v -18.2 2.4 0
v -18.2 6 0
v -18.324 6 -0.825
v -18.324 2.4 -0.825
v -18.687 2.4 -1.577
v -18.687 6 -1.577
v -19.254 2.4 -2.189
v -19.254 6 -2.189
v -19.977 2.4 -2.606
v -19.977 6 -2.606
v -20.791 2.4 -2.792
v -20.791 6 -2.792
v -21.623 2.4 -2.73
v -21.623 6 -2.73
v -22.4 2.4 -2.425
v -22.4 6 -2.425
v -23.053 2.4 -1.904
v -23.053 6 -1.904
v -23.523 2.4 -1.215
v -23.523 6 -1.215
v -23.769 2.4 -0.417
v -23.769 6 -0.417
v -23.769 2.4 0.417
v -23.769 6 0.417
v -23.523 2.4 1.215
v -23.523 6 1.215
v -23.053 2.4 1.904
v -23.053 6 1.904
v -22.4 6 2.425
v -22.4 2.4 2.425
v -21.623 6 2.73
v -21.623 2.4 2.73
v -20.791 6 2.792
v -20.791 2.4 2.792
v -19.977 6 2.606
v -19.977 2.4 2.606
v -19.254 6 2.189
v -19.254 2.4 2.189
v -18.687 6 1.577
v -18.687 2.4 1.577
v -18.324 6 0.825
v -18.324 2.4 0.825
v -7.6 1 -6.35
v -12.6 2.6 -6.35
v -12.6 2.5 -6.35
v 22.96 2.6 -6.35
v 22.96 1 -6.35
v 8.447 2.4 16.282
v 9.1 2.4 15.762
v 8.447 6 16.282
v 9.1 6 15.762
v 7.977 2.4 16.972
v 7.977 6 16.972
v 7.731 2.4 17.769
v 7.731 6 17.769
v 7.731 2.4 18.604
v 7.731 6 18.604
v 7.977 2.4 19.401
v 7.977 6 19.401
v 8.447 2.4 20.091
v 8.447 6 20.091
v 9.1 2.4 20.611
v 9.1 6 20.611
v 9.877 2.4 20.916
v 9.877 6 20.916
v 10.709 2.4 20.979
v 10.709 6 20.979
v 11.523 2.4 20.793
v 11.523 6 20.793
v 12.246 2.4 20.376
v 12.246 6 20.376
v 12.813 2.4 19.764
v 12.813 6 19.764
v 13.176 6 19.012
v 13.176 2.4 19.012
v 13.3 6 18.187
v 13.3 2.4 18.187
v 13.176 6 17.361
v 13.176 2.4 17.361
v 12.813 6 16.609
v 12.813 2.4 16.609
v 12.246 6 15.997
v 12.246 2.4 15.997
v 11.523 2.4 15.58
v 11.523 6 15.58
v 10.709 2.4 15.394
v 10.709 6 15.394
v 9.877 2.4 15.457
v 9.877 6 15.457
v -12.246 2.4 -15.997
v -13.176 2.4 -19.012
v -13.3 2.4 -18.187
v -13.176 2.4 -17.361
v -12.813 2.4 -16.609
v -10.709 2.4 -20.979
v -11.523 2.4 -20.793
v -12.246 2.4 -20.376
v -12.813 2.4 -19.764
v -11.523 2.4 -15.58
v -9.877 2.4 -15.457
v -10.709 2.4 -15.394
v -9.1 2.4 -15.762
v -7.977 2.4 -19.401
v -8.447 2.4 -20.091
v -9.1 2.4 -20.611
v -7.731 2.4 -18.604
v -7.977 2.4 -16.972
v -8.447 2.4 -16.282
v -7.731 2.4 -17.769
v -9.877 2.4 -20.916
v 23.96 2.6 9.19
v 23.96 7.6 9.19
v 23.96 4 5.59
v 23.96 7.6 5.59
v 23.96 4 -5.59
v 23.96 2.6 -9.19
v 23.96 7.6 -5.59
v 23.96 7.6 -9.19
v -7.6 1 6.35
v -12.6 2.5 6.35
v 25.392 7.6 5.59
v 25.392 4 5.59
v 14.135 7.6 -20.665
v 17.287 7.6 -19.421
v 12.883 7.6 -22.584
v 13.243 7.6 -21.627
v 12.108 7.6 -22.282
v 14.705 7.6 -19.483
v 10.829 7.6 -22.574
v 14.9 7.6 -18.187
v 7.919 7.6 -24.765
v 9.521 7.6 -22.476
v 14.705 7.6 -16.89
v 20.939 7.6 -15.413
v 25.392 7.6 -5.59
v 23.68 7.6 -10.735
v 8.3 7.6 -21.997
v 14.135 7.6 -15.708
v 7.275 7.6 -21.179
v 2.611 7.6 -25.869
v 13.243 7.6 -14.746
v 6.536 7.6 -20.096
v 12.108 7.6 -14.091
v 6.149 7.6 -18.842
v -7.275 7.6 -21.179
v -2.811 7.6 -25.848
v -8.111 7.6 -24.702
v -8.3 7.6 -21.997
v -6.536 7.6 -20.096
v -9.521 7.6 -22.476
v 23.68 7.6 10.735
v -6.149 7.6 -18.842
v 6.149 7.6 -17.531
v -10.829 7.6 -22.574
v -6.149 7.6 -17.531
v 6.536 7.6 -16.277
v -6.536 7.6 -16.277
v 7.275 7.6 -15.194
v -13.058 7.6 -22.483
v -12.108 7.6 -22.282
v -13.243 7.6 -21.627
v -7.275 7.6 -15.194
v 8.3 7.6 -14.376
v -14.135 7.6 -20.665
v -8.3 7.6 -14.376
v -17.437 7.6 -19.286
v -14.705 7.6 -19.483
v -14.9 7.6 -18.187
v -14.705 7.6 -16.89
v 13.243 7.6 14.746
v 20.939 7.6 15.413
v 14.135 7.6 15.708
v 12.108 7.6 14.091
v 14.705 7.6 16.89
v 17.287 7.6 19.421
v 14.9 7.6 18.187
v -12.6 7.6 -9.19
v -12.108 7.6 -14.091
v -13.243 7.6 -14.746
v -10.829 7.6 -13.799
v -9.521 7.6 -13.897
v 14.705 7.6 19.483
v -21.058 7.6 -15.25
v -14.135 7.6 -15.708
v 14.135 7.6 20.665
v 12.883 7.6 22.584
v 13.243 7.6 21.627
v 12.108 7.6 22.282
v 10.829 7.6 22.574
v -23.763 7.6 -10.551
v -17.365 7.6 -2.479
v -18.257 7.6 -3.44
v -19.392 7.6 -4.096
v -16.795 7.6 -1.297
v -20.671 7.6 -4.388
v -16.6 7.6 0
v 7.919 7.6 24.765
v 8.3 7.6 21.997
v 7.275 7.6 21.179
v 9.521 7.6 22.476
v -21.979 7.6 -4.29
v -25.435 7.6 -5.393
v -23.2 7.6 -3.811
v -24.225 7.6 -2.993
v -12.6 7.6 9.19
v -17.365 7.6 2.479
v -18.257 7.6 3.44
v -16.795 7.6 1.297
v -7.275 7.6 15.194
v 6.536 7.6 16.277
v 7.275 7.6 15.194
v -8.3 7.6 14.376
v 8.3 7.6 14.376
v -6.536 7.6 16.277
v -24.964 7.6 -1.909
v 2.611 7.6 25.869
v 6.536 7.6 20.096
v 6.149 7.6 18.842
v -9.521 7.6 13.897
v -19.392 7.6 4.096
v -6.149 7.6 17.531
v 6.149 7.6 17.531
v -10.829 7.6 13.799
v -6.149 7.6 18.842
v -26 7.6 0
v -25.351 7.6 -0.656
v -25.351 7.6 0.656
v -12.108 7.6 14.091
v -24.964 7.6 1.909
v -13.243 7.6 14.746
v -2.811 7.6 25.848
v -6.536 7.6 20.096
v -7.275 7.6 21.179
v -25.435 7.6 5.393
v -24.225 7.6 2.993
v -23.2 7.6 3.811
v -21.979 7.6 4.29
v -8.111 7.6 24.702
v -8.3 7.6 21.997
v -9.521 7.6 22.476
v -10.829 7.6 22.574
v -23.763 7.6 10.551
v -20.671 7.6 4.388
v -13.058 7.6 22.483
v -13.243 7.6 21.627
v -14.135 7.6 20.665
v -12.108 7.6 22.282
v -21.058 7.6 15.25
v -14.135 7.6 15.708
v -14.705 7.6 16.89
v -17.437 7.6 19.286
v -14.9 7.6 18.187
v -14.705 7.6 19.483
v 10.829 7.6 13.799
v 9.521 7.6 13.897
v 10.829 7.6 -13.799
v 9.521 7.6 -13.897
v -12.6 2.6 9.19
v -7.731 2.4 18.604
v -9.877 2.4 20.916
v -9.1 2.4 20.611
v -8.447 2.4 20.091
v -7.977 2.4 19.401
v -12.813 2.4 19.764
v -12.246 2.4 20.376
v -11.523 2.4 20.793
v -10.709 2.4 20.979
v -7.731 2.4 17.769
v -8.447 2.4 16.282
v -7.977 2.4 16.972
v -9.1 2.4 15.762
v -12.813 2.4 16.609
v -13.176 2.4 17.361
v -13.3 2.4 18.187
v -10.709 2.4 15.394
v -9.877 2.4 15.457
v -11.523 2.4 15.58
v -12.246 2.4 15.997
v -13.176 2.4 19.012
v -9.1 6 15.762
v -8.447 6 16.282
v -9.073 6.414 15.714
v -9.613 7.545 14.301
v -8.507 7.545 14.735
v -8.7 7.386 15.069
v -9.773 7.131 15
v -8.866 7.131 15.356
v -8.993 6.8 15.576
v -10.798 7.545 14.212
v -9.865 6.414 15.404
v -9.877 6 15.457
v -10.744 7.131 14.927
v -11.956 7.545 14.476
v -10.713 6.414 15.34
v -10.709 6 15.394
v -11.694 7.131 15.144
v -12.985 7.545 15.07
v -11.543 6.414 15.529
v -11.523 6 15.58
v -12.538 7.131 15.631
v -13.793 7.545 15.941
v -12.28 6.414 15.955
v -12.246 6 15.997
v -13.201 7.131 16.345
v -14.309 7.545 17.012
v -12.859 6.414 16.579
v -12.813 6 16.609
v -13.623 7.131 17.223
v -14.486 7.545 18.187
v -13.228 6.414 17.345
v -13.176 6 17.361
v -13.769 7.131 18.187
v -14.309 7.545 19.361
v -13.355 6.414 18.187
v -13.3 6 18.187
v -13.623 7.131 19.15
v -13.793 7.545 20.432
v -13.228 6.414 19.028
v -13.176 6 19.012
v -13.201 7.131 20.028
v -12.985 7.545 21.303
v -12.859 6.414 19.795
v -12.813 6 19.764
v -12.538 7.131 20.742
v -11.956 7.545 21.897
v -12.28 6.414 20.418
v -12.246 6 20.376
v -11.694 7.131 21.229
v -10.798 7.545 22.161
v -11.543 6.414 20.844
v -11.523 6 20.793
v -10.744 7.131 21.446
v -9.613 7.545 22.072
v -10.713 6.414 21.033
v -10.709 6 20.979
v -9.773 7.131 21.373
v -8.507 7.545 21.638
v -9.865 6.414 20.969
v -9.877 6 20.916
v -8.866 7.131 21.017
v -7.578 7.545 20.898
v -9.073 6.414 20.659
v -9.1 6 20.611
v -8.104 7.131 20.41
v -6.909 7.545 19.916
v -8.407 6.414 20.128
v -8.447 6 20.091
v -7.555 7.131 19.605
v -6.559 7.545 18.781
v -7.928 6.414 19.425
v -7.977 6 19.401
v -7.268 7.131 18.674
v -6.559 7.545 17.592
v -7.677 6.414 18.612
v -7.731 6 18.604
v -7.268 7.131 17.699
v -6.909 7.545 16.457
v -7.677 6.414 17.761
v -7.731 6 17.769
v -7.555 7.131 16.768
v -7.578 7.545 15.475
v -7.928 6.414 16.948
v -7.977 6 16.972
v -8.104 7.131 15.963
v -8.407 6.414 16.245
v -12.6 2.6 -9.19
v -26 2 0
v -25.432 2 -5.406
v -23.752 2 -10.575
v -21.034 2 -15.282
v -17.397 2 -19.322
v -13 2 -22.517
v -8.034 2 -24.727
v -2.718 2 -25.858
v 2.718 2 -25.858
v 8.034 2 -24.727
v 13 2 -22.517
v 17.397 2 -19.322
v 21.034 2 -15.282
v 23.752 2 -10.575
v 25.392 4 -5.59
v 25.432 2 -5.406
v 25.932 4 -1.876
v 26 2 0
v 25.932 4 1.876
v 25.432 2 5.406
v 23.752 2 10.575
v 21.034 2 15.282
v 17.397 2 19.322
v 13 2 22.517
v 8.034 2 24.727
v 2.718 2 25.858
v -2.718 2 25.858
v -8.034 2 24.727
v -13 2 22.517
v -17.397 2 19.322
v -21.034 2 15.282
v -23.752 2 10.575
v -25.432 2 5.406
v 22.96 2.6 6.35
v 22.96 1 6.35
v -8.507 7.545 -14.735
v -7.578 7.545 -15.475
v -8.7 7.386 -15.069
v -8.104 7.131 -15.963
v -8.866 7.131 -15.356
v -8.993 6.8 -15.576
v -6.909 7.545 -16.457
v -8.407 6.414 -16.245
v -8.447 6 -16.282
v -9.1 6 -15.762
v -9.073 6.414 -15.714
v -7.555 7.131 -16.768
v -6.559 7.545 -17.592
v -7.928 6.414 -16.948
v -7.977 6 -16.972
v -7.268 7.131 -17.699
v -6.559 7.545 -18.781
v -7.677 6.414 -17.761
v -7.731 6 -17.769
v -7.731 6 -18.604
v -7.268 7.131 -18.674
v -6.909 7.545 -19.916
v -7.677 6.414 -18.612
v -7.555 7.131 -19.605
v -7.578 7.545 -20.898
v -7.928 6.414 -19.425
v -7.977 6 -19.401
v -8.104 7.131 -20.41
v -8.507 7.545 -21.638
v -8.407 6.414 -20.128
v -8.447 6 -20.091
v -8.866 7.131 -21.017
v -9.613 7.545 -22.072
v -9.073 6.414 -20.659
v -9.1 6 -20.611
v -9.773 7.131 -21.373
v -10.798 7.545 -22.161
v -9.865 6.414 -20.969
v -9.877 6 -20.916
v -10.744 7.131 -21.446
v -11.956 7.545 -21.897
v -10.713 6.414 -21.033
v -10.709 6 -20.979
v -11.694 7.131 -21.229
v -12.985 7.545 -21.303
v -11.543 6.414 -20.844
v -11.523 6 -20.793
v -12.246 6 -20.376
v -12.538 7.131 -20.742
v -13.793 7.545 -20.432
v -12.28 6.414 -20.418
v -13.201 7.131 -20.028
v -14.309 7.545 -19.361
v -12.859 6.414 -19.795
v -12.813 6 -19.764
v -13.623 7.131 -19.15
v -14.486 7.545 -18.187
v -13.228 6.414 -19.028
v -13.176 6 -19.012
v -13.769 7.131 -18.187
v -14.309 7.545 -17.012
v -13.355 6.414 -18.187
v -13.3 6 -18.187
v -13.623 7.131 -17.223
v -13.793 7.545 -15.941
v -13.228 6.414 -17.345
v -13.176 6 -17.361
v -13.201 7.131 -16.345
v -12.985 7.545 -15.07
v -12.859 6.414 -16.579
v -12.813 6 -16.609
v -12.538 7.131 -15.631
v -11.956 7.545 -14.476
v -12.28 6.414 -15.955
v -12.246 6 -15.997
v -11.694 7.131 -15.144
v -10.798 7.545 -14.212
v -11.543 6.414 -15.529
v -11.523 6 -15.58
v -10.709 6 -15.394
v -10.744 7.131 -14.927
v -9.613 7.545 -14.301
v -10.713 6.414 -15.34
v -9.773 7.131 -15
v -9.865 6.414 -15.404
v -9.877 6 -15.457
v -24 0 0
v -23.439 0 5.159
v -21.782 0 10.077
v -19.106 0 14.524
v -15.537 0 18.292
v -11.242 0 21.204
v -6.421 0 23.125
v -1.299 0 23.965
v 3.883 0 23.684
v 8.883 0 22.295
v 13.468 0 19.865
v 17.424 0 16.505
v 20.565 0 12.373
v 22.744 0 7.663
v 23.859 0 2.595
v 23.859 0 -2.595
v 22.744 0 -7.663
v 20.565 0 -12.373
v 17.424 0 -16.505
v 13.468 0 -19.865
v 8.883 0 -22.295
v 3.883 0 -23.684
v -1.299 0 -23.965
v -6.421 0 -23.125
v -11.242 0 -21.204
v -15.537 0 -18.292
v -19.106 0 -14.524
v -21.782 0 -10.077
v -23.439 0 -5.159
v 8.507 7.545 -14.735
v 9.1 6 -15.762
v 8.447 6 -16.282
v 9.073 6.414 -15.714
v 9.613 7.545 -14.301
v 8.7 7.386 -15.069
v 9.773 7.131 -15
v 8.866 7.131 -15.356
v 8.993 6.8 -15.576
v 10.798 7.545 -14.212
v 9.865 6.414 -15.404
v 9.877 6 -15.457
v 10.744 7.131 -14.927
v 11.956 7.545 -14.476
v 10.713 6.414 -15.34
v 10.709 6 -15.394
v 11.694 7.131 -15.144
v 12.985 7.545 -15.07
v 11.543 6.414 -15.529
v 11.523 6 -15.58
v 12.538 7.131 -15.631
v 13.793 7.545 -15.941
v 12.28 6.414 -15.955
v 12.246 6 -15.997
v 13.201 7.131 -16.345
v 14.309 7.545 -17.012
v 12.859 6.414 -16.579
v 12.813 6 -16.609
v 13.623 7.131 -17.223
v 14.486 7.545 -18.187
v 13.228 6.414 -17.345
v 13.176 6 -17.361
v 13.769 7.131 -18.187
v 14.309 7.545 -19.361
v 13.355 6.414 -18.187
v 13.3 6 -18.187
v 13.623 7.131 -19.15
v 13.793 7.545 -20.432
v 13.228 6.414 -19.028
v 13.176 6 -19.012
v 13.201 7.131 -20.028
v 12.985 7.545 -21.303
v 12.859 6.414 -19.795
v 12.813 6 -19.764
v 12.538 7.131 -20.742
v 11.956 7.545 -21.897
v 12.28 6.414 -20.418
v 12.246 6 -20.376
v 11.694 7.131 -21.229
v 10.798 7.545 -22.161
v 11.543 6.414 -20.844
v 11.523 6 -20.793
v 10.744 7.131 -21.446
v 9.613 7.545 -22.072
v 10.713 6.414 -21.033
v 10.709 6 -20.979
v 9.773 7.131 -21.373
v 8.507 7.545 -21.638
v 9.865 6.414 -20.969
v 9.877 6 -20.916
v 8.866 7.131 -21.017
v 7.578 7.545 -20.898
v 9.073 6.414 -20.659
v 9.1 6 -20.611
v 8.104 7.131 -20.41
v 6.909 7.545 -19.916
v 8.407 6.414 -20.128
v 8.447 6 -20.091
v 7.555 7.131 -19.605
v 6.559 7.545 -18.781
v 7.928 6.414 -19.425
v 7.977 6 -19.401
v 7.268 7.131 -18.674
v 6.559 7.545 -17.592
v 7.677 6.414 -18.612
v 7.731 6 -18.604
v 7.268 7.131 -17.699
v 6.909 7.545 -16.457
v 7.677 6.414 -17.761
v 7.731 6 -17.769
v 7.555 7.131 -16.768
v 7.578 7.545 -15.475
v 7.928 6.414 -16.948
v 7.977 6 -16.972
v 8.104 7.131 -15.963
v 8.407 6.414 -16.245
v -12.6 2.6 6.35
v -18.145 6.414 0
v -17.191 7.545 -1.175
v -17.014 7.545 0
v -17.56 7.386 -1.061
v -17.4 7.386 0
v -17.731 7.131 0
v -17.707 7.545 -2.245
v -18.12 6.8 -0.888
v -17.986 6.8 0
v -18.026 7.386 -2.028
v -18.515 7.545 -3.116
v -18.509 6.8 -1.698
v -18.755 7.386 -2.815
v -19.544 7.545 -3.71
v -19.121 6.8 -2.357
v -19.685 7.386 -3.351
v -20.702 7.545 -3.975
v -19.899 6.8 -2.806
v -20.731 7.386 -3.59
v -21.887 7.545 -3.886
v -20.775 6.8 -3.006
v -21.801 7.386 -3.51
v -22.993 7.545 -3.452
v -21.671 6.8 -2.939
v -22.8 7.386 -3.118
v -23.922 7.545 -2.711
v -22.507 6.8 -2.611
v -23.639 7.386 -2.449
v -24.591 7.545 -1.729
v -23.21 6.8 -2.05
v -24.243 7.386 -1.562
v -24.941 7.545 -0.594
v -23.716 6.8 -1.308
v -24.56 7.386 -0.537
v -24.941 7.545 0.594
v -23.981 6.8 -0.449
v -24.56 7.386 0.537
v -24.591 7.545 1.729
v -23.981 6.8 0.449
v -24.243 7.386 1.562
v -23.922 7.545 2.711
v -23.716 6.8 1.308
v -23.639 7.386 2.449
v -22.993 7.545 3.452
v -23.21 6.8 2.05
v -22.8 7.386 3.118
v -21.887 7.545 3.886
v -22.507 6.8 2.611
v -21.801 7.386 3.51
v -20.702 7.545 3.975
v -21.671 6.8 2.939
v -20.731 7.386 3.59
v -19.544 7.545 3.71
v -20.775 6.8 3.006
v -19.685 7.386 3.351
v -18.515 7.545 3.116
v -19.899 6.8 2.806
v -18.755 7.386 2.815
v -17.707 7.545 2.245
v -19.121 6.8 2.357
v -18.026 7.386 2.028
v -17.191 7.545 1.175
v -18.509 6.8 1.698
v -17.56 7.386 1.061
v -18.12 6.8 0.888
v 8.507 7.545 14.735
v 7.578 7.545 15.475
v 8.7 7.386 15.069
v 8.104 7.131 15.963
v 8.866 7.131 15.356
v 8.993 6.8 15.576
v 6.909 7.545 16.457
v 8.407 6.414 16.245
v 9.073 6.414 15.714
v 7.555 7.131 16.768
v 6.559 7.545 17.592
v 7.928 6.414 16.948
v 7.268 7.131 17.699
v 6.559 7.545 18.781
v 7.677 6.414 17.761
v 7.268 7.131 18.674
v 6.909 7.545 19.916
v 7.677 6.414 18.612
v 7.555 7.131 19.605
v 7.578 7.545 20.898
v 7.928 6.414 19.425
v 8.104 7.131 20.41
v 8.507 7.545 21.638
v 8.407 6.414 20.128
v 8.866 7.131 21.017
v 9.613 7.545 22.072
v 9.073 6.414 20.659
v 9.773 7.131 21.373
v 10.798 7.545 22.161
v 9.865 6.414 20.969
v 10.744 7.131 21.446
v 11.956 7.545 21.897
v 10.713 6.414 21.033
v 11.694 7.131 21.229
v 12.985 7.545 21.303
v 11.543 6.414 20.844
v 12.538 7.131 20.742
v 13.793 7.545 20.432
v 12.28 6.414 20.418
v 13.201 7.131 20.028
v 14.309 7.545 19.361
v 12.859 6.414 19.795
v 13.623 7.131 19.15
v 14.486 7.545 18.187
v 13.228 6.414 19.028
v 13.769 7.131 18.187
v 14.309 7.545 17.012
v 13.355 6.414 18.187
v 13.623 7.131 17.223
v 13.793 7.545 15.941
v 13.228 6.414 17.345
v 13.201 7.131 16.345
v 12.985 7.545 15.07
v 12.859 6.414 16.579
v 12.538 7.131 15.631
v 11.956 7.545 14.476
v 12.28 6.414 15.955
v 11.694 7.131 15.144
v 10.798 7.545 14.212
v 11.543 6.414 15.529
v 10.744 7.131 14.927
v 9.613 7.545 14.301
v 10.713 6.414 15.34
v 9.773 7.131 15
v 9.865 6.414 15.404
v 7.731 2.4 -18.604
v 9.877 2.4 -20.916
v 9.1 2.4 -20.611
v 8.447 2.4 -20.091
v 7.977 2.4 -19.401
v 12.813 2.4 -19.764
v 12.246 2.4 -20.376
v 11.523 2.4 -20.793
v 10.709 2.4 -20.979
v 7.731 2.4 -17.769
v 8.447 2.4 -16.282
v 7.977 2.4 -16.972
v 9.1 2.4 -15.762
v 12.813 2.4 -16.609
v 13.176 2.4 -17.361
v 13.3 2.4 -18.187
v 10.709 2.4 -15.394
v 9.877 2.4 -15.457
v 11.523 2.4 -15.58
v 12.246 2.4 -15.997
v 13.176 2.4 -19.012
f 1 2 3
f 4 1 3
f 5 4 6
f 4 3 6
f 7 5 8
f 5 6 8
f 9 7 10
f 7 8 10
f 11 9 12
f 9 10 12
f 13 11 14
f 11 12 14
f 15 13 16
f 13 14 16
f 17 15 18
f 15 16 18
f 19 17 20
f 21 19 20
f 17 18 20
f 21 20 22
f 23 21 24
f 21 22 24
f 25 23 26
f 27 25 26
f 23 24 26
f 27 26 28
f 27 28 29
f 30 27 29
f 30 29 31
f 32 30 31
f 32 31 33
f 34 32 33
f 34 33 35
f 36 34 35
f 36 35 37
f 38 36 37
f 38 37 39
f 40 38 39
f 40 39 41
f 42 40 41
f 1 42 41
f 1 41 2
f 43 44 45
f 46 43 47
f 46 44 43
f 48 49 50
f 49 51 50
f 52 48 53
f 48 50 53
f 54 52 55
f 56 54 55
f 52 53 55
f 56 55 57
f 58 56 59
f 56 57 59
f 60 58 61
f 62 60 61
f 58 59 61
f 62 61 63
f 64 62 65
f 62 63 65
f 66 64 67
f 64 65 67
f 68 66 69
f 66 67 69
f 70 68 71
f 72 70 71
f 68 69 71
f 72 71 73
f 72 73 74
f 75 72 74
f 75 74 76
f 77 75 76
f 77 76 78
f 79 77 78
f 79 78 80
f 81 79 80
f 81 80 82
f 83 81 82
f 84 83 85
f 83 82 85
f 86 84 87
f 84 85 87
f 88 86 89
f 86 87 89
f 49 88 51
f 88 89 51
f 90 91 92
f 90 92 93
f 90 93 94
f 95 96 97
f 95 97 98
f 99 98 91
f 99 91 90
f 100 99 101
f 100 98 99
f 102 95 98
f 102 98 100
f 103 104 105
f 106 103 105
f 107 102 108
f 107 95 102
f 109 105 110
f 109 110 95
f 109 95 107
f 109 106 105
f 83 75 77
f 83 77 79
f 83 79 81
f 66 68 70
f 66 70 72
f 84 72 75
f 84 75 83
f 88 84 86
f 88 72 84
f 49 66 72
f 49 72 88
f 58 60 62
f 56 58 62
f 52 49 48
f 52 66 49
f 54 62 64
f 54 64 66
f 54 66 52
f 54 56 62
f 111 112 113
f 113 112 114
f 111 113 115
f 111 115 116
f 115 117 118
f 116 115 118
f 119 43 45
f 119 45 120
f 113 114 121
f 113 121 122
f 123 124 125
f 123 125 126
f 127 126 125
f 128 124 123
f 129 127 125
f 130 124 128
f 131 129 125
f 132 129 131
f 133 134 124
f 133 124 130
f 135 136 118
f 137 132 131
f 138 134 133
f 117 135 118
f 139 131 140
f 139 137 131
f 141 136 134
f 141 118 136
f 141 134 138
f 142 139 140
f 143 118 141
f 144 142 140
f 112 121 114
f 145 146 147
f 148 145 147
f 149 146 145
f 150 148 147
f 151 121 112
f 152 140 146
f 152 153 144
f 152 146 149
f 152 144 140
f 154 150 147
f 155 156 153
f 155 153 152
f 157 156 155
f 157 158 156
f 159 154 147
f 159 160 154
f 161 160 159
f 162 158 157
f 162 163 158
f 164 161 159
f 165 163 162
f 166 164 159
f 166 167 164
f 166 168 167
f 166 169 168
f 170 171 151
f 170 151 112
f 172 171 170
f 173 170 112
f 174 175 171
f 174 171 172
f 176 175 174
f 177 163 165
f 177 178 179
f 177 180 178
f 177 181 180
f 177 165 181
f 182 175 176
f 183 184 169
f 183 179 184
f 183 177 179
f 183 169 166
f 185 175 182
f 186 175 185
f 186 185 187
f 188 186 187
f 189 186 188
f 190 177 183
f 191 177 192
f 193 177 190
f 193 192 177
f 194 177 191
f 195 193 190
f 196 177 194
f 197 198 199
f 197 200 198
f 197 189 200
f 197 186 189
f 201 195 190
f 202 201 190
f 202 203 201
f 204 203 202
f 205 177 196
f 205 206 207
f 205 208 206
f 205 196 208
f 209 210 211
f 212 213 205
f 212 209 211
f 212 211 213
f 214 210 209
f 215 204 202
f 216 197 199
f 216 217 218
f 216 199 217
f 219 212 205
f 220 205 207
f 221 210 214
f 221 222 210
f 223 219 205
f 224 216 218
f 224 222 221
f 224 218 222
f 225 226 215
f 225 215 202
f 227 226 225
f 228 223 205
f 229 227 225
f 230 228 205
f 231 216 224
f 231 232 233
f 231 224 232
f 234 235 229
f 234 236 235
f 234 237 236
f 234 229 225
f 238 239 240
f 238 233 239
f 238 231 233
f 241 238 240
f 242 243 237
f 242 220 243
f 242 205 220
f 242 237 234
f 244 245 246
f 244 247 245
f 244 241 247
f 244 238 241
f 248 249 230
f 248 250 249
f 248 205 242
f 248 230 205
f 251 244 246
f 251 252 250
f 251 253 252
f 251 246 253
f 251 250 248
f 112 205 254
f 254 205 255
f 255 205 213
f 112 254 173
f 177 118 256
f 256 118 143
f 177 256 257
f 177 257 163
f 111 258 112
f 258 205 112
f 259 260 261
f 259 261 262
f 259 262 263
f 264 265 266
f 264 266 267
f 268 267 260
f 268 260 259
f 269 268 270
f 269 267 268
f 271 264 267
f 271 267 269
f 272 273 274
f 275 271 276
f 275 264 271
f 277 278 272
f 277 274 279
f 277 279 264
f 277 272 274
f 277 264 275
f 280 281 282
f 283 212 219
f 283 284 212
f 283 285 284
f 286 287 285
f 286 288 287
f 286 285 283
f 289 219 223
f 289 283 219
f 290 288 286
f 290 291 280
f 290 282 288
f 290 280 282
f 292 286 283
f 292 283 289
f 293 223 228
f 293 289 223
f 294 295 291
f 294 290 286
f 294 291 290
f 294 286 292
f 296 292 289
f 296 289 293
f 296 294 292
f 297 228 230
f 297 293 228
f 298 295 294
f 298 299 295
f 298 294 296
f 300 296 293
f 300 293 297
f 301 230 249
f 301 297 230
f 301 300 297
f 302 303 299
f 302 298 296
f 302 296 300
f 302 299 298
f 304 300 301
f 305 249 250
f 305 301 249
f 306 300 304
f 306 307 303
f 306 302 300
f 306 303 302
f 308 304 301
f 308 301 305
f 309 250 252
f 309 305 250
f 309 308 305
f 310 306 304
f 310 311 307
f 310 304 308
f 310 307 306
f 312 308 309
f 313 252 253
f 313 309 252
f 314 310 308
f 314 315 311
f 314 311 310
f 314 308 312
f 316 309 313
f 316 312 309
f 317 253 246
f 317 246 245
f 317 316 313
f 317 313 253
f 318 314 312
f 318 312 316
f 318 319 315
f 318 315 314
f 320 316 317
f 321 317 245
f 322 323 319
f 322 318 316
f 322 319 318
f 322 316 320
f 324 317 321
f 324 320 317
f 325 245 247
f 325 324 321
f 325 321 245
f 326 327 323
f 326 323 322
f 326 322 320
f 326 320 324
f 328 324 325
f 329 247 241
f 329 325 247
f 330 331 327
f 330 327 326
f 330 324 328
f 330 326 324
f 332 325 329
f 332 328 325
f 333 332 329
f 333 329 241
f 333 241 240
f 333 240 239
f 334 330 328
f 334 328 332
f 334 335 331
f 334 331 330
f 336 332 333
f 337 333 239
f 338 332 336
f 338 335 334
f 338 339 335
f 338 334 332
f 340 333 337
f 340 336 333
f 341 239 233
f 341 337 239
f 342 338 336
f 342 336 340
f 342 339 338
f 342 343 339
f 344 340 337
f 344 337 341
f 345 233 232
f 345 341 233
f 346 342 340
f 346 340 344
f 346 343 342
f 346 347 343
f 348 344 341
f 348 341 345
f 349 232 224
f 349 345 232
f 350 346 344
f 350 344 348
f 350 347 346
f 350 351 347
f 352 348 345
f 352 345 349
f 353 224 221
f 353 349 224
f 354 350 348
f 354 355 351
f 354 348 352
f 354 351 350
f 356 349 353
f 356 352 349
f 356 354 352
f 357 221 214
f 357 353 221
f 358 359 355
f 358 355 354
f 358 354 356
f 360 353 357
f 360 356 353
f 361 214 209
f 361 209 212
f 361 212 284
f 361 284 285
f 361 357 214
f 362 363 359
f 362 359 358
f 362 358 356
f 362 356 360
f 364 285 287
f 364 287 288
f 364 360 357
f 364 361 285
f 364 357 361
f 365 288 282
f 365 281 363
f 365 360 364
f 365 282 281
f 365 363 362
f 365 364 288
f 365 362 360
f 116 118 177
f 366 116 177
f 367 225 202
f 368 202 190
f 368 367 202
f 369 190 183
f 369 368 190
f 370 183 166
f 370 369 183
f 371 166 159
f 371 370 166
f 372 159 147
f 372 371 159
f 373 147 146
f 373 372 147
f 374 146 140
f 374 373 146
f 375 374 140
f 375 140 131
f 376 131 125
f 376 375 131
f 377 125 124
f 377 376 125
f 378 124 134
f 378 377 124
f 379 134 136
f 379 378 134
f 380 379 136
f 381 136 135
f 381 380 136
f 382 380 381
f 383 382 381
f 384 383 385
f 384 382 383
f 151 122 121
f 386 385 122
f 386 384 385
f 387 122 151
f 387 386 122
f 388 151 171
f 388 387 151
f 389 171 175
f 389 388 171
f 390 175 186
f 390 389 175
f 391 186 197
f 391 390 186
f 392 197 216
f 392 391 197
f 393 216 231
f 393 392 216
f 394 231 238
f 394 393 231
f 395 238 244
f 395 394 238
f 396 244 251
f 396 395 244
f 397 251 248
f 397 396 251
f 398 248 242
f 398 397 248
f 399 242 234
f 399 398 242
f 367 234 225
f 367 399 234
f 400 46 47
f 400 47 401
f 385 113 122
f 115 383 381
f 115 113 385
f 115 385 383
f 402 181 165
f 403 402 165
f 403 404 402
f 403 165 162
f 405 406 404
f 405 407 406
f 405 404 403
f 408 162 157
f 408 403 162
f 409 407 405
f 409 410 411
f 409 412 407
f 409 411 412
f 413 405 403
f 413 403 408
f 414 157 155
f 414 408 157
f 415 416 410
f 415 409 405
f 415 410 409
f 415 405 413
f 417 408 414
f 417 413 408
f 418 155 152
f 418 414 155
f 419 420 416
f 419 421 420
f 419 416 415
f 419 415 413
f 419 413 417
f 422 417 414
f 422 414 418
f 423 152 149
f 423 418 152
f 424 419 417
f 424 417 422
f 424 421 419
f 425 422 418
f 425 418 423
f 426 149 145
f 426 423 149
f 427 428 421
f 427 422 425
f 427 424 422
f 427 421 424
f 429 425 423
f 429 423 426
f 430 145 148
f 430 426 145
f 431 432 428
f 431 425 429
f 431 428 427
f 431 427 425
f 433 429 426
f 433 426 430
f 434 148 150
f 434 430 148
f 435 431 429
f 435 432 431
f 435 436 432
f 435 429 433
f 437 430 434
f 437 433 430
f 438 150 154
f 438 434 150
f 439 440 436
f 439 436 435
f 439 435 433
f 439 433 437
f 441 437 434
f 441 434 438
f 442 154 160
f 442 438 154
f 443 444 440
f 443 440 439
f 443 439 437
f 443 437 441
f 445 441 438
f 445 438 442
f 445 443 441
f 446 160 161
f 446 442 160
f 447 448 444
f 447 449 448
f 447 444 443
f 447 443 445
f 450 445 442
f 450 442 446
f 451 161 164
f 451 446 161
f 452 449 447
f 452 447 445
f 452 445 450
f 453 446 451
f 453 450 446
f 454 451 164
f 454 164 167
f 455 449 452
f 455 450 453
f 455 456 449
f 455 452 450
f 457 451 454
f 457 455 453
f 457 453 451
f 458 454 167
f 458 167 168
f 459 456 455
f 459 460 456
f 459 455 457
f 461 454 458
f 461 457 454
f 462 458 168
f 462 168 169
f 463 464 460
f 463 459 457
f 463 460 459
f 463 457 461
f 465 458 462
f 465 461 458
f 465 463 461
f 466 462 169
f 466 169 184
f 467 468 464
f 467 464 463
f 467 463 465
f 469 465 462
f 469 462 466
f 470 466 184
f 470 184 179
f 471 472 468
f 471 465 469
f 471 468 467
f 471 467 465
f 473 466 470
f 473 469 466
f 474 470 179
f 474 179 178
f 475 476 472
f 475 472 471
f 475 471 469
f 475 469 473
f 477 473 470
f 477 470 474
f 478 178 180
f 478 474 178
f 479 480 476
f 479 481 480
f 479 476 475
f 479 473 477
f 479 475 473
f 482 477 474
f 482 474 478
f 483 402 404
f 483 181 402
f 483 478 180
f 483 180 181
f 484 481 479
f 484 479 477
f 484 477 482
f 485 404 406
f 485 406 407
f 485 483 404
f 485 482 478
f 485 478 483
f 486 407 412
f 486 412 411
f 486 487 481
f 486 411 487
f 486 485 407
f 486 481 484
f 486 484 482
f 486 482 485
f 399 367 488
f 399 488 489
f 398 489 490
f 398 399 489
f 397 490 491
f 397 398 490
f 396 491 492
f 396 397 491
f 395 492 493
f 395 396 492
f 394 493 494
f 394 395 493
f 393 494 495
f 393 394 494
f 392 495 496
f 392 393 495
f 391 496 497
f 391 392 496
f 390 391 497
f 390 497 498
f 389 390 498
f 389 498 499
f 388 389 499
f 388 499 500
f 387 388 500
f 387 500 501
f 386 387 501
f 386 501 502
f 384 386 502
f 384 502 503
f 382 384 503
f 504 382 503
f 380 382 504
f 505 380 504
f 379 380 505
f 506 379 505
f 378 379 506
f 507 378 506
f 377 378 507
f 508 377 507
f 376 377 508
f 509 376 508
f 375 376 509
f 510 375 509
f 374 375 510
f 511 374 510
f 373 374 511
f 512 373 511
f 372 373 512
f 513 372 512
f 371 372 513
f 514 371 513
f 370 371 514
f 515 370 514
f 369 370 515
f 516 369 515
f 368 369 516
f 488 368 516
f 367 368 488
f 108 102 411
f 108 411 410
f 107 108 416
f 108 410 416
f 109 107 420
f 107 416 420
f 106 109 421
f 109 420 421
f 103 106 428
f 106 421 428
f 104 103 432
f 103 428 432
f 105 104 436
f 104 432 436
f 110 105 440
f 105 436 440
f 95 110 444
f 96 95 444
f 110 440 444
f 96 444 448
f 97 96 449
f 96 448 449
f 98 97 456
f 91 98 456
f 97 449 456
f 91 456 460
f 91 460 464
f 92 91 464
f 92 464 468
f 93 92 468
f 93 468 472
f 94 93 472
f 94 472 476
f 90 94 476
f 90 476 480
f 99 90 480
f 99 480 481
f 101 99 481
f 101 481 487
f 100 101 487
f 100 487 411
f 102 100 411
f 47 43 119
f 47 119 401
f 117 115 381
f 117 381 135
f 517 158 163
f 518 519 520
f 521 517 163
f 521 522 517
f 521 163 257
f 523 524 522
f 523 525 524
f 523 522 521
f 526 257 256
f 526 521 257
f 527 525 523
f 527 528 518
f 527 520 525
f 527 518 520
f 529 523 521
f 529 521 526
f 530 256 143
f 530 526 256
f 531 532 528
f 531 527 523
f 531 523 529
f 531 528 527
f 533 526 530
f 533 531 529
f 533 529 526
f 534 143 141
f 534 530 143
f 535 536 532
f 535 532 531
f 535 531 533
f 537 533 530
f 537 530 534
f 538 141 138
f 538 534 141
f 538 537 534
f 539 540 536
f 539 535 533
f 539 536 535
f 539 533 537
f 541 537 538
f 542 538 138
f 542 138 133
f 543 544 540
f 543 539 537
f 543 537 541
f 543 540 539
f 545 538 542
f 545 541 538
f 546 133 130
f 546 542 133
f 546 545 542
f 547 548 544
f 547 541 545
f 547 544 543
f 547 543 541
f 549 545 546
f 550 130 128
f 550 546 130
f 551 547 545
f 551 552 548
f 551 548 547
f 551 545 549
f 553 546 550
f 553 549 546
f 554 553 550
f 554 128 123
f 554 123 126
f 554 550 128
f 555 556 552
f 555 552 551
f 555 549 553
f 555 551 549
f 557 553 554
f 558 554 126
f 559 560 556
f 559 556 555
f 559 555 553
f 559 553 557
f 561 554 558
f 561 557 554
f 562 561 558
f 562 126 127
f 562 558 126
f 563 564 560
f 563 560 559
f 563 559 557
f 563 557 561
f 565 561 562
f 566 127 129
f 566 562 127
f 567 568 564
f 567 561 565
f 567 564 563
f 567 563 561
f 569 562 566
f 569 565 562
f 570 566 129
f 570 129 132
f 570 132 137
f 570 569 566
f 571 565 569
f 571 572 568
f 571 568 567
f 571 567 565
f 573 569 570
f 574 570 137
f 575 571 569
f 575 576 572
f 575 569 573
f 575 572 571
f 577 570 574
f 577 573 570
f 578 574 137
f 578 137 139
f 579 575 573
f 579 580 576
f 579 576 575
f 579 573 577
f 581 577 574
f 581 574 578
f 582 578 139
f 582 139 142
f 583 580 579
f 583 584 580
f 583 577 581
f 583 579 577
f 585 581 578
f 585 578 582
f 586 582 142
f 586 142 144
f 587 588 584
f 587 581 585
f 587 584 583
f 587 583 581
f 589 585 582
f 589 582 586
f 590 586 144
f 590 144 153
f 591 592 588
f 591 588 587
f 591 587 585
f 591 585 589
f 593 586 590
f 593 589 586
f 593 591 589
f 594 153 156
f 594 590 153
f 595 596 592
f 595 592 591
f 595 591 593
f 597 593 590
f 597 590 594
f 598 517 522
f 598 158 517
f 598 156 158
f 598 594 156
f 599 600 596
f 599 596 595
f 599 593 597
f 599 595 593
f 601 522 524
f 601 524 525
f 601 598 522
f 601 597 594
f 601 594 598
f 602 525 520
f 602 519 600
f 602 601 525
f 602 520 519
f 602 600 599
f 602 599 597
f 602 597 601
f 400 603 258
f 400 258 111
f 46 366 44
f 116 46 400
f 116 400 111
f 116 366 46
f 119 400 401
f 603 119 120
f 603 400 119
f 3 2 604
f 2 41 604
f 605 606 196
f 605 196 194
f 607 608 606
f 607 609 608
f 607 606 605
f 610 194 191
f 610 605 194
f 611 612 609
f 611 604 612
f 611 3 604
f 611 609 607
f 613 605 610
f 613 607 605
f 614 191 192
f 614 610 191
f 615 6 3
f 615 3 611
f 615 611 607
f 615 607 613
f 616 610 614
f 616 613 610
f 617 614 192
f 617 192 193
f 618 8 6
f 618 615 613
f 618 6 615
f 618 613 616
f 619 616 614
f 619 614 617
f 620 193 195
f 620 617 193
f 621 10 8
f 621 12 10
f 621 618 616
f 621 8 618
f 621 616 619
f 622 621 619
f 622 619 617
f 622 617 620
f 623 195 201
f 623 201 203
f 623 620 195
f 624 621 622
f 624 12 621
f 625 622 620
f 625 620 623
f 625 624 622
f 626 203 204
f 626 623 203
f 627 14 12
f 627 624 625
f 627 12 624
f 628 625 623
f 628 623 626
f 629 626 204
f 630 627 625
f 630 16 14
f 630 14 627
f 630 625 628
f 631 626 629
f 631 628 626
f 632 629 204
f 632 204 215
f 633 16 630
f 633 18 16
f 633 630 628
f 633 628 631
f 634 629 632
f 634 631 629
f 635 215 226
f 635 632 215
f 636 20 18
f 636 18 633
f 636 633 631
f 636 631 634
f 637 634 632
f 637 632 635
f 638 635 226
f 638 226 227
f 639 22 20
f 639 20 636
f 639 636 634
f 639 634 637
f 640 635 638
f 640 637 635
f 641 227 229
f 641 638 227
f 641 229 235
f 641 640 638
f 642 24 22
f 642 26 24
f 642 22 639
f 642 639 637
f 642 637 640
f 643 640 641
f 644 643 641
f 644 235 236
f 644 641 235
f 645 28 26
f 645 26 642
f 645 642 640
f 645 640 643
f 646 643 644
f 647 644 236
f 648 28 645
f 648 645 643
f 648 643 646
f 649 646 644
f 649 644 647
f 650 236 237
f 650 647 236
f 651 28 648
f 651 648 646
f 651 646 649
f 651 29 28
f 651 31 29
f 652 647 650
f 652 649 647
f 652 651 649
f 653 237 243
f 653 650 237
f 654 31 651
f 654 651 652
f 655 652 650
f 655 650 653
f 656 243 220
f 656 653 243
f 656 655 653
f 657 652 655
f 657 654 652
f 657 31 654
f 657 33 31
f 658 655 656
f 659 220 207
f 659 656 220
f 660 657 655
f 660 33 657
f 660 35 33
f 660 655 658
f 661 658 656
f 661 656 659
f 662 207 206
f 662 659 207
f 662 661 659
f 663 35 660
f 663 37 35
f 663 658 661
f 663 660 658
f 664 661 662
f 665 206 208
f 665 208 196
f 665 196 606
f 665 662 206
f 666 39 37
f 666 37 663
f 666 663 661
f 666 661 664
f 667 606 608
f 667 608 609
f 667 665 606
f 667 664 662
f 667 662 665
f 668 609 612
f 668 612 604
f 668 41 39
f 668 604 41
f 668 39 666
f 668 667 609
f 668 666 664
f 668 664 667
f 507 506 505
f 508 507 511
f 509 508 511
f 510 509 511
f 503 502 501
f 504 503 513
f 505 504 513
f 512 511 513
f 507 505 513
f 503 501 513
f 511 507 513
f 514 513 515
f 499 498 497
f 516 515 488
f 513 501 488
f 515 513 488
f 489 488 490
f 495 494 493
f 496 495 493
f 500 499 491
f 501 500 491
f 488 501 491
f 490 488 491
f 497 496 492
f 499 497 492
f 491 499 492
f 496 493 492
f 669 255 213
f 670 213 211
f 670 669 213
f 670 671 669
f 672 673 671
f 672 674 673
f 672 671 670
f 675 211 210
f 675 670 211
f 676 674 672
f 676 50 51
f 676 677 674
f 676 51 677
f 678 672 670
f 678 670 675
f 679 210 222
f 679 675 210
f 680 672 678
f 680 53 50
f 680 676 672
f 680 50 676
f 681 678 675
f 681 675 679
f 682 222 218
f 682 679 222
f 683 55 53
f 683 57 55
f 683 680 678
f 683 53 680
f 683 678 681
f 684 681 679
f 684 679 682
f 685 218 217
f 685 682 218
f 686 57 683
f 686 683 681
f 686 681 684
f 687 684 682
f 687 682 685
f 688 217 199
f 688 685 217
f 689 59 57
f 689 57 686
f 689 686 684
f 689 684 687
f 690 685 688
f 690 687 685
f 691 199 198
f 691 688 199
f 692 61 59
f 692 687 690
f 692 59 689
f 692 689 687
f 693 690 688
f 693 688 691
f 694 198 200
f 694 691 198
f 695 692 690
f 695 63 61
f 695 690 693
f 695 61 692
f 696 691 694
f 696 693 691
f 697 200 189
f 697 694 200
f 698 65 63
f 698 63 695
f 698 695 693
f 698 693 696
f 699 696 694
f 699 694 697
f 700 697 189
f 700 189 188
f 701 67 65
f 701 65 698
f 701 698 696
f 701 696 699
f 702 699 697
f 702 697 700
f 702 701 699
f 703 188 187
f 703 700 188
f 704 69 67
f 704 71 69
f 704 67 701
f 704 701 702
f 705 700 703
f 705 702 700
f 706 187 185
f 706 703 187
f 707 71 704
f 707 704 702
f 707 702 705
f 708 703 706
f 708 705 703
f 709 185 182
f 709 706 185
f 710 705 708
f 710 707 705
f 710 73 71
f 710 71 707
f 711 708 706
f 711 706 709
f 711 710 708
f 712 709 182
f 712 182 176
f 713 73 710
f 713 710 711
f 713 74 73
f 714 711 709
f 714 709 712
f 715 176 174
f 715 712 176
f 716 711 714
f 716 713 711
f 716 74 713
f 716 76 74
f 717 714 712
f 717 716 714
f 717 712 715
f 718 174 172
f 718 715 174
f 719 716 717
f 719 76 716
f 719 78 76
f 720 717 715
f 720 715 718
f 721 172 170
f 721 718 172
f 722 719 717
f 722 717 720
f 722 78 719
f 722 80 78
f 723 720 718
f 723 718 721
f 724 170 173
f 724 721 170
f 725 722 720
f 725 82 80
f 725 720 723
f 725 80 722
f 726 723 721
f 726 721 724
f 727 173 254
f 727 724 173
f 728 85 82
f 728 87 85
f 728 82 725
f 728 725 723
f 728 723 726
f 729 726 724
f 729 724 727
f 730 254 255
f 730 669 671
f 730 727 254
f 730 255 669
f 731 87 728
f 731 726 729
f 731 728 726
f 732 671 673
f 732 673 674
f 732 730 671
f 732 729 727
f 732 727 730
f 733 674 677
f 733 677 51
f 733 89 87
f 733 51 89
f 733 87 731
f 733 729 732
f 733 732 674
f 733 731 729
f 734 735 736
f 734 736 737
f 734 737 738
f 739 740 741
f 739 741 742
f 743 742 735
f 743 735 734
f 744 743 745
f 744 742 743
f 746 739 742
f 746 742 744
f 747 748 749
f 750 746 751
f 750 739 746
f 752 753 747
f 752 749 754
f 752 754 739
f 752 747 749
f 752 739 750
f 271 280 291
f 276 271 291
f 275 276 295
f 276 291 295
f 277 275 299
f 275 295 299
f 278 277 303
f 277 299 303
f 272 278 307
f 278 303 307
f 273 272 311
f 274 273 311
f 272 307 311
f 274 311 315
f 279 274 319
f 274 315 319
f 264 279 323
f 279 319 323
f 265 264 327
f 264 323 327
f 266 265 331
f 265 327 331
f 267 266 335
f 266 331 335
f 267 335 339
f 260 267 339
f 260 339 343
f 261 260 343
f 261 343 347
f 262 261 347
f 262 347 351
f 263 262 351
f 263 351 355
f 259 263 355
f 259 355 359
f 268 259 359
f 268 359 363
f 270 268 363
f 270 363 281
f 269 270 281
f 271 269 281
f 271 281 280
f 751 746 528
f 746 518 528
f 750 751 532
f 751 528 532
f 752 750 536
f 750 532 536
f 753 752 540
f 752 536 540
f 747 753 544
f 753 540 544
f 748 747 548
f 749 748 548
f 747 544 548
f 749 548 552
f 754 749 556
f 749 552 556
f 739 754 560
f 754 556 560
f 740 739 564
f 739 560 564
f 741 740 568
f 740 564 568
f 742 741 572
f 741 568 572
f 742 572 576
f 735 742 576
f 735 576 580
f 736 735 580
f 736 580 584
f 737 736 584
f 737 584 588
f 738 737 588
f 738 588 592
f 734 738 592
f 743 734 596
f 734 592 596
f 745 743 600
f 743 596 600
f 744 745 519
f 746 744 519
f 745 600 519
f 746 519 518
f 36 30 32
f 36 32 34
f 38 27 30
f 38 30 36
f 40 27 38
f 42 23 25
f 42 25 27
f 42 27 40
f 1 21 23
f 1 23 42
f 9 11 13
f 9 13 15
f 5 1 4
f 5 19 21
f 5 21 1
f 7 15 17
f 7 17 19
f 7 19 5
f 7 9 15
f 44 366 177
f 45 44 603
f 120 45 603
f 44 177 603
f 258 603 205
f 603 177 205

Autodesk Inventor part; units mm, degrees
ref_plane "YZ Plane" through (0, 0, 0) normal (1, 0, 0) x (0, 1, 0)
ref_plane "XZ Plane" through (0, 0, 0) normal (0, 1, 0) x (-1, 0, 0)
ref_plane "XY Plane" through (0, 0, 0) normal (0, 0, 1) x (1, 0, 0)
sketch "Sketch1" plane through (0, 0, 0) normal (0, 1, 0) x (-1, 0, 0)
  circle A0 centre (0, 0) radius 26
  dimension "d0" = 52
extrude "Extrusion1" add sketch "Sketch1" along normal blind 7.6
chamfer "Chamfer2" distance 2 angle 45 1 edges at (26, 0, 0)
sketch "Sketch2" plane through (0, 7.6, 0) normal (0, 1, 0) x (1, 0, 0)
  line L0 (-12.6, -9.19) -> (23.96, -9.19)
  line L1 (23.96, -9.19) -> (23.96, 9.19)
  line L2 (23.96, 9.19) -> (-12.6, 9.19)
  line L3 (-12.6, 9.19) -> (-12.6, -9.19)
  point P0 (0, 0)
  dimension "d5" = 36.56
  dimension "d6" = 18.38
  dimension "d7" = 9.19
  dimension "d8" = 12.6
extrude "Extrusion2" cut sketch "Sketch2" against normal blind 5
sketch "Sketch3" plane through (23.96, 7.6, -9.19) normal (-1, 0, 0) x (0, 0, 1)
  line L0 (3.6, 0) -> (14.78, 0)
  line L1 (14.78, 0) -> (14.78, -3.6)
  line L2 (14.78, -3.6) -> (3.6, -3.6)
  line L3 (3.6, -3.6) -> (3.6, 0)
  line L4 (0, 0) -> (18.38, 0) projected
  line L5 (0, -5) -> (18.38, -5) projected
  line L6 (0, 0) -> (0, -5) projected
  line L7 (18.38, 0) -> (18.38, -5) projected
  point P0 (9.19, -7.6)
  dimension "d11" = 0
  dimension "d14" = 3.6
  dimension "d44" = 3.6
  dimension "d47" = 1.4
extrude "Extrusion3" cut sketch "Sketch3" against normal through all contours L0 L1 L2 L3
ref_plane "Work Plane1" through (-12.6, 7.6, 0) normal (0, 0, 1) x (1, 0, 0)
sketch "Sketch7" plane through (0, 2.6, 0) normal (0, 1, 0) x (1, 0, 0)
  line L0 (-12.6, 6.35) -> (22.96, 6.35)
  line L1 (22.96, 6.35) -> (22.96, -6.35)
  line L2 (22.96, -6.35) -> (-12.6, -6.35)
  line L3 (-12.6, -6.35) -> (-12.6, 6.35)
  line L4 (36.4, 0) -> (-36.4, 0) projected
  line L5 (-12.6, -9.19) -> (-12.6, 9.19) projected
  point P0 (0, 0)
  dimension "d28" = 12.7
  dimension "d29" = 35.56
  dimension "d30" = 6.35
  dimension "d31" = 0
extrude "Extrusion5" cut sketch "Sketch7" against normal blind 1.6
sketch "Sketch4" plane through (0, 7.6, 0) normal (0, 1, 0) x (1, 0, 0)
  circle A0 centre (-21, 0) radius 2.8
  arc A1 (25.392, 5.59) -> (25.392, -5.59) centre (0, 0) ccw projected
  point P0 (24.6995, 8.12)
  point P1 (24.6995, -8.12)
  dimension "d17" = 5.6
  dimension "d23" = 21
extrude "Extrusion4" cut sketch "Sketch4" against normal blind 5.2
fillet "Fillet4" radius 1.6 1 edges at (-23.8, 7.6, 0)
pattern_circular "Circular Pattern2" count 5 over 240 about axis through (0, 7.6, 0) along (0, 1, 0) of "Extrusion4", "Fillet4" both ways yes
chamfer "Chamfer3" distance 1.5 distance2 5 1 edges at (-12.6, 1, 0) measured on face at (-12.6, 5.9333, -2.1167)
equation "\"d7\" = 0.5 * d6"
equation "\"d44\" = d14"
equation "\"d30\" = 0.5 * d28"
equation "\"d24\" = 0.5 * d6"
properties part number "_3DPrint"
